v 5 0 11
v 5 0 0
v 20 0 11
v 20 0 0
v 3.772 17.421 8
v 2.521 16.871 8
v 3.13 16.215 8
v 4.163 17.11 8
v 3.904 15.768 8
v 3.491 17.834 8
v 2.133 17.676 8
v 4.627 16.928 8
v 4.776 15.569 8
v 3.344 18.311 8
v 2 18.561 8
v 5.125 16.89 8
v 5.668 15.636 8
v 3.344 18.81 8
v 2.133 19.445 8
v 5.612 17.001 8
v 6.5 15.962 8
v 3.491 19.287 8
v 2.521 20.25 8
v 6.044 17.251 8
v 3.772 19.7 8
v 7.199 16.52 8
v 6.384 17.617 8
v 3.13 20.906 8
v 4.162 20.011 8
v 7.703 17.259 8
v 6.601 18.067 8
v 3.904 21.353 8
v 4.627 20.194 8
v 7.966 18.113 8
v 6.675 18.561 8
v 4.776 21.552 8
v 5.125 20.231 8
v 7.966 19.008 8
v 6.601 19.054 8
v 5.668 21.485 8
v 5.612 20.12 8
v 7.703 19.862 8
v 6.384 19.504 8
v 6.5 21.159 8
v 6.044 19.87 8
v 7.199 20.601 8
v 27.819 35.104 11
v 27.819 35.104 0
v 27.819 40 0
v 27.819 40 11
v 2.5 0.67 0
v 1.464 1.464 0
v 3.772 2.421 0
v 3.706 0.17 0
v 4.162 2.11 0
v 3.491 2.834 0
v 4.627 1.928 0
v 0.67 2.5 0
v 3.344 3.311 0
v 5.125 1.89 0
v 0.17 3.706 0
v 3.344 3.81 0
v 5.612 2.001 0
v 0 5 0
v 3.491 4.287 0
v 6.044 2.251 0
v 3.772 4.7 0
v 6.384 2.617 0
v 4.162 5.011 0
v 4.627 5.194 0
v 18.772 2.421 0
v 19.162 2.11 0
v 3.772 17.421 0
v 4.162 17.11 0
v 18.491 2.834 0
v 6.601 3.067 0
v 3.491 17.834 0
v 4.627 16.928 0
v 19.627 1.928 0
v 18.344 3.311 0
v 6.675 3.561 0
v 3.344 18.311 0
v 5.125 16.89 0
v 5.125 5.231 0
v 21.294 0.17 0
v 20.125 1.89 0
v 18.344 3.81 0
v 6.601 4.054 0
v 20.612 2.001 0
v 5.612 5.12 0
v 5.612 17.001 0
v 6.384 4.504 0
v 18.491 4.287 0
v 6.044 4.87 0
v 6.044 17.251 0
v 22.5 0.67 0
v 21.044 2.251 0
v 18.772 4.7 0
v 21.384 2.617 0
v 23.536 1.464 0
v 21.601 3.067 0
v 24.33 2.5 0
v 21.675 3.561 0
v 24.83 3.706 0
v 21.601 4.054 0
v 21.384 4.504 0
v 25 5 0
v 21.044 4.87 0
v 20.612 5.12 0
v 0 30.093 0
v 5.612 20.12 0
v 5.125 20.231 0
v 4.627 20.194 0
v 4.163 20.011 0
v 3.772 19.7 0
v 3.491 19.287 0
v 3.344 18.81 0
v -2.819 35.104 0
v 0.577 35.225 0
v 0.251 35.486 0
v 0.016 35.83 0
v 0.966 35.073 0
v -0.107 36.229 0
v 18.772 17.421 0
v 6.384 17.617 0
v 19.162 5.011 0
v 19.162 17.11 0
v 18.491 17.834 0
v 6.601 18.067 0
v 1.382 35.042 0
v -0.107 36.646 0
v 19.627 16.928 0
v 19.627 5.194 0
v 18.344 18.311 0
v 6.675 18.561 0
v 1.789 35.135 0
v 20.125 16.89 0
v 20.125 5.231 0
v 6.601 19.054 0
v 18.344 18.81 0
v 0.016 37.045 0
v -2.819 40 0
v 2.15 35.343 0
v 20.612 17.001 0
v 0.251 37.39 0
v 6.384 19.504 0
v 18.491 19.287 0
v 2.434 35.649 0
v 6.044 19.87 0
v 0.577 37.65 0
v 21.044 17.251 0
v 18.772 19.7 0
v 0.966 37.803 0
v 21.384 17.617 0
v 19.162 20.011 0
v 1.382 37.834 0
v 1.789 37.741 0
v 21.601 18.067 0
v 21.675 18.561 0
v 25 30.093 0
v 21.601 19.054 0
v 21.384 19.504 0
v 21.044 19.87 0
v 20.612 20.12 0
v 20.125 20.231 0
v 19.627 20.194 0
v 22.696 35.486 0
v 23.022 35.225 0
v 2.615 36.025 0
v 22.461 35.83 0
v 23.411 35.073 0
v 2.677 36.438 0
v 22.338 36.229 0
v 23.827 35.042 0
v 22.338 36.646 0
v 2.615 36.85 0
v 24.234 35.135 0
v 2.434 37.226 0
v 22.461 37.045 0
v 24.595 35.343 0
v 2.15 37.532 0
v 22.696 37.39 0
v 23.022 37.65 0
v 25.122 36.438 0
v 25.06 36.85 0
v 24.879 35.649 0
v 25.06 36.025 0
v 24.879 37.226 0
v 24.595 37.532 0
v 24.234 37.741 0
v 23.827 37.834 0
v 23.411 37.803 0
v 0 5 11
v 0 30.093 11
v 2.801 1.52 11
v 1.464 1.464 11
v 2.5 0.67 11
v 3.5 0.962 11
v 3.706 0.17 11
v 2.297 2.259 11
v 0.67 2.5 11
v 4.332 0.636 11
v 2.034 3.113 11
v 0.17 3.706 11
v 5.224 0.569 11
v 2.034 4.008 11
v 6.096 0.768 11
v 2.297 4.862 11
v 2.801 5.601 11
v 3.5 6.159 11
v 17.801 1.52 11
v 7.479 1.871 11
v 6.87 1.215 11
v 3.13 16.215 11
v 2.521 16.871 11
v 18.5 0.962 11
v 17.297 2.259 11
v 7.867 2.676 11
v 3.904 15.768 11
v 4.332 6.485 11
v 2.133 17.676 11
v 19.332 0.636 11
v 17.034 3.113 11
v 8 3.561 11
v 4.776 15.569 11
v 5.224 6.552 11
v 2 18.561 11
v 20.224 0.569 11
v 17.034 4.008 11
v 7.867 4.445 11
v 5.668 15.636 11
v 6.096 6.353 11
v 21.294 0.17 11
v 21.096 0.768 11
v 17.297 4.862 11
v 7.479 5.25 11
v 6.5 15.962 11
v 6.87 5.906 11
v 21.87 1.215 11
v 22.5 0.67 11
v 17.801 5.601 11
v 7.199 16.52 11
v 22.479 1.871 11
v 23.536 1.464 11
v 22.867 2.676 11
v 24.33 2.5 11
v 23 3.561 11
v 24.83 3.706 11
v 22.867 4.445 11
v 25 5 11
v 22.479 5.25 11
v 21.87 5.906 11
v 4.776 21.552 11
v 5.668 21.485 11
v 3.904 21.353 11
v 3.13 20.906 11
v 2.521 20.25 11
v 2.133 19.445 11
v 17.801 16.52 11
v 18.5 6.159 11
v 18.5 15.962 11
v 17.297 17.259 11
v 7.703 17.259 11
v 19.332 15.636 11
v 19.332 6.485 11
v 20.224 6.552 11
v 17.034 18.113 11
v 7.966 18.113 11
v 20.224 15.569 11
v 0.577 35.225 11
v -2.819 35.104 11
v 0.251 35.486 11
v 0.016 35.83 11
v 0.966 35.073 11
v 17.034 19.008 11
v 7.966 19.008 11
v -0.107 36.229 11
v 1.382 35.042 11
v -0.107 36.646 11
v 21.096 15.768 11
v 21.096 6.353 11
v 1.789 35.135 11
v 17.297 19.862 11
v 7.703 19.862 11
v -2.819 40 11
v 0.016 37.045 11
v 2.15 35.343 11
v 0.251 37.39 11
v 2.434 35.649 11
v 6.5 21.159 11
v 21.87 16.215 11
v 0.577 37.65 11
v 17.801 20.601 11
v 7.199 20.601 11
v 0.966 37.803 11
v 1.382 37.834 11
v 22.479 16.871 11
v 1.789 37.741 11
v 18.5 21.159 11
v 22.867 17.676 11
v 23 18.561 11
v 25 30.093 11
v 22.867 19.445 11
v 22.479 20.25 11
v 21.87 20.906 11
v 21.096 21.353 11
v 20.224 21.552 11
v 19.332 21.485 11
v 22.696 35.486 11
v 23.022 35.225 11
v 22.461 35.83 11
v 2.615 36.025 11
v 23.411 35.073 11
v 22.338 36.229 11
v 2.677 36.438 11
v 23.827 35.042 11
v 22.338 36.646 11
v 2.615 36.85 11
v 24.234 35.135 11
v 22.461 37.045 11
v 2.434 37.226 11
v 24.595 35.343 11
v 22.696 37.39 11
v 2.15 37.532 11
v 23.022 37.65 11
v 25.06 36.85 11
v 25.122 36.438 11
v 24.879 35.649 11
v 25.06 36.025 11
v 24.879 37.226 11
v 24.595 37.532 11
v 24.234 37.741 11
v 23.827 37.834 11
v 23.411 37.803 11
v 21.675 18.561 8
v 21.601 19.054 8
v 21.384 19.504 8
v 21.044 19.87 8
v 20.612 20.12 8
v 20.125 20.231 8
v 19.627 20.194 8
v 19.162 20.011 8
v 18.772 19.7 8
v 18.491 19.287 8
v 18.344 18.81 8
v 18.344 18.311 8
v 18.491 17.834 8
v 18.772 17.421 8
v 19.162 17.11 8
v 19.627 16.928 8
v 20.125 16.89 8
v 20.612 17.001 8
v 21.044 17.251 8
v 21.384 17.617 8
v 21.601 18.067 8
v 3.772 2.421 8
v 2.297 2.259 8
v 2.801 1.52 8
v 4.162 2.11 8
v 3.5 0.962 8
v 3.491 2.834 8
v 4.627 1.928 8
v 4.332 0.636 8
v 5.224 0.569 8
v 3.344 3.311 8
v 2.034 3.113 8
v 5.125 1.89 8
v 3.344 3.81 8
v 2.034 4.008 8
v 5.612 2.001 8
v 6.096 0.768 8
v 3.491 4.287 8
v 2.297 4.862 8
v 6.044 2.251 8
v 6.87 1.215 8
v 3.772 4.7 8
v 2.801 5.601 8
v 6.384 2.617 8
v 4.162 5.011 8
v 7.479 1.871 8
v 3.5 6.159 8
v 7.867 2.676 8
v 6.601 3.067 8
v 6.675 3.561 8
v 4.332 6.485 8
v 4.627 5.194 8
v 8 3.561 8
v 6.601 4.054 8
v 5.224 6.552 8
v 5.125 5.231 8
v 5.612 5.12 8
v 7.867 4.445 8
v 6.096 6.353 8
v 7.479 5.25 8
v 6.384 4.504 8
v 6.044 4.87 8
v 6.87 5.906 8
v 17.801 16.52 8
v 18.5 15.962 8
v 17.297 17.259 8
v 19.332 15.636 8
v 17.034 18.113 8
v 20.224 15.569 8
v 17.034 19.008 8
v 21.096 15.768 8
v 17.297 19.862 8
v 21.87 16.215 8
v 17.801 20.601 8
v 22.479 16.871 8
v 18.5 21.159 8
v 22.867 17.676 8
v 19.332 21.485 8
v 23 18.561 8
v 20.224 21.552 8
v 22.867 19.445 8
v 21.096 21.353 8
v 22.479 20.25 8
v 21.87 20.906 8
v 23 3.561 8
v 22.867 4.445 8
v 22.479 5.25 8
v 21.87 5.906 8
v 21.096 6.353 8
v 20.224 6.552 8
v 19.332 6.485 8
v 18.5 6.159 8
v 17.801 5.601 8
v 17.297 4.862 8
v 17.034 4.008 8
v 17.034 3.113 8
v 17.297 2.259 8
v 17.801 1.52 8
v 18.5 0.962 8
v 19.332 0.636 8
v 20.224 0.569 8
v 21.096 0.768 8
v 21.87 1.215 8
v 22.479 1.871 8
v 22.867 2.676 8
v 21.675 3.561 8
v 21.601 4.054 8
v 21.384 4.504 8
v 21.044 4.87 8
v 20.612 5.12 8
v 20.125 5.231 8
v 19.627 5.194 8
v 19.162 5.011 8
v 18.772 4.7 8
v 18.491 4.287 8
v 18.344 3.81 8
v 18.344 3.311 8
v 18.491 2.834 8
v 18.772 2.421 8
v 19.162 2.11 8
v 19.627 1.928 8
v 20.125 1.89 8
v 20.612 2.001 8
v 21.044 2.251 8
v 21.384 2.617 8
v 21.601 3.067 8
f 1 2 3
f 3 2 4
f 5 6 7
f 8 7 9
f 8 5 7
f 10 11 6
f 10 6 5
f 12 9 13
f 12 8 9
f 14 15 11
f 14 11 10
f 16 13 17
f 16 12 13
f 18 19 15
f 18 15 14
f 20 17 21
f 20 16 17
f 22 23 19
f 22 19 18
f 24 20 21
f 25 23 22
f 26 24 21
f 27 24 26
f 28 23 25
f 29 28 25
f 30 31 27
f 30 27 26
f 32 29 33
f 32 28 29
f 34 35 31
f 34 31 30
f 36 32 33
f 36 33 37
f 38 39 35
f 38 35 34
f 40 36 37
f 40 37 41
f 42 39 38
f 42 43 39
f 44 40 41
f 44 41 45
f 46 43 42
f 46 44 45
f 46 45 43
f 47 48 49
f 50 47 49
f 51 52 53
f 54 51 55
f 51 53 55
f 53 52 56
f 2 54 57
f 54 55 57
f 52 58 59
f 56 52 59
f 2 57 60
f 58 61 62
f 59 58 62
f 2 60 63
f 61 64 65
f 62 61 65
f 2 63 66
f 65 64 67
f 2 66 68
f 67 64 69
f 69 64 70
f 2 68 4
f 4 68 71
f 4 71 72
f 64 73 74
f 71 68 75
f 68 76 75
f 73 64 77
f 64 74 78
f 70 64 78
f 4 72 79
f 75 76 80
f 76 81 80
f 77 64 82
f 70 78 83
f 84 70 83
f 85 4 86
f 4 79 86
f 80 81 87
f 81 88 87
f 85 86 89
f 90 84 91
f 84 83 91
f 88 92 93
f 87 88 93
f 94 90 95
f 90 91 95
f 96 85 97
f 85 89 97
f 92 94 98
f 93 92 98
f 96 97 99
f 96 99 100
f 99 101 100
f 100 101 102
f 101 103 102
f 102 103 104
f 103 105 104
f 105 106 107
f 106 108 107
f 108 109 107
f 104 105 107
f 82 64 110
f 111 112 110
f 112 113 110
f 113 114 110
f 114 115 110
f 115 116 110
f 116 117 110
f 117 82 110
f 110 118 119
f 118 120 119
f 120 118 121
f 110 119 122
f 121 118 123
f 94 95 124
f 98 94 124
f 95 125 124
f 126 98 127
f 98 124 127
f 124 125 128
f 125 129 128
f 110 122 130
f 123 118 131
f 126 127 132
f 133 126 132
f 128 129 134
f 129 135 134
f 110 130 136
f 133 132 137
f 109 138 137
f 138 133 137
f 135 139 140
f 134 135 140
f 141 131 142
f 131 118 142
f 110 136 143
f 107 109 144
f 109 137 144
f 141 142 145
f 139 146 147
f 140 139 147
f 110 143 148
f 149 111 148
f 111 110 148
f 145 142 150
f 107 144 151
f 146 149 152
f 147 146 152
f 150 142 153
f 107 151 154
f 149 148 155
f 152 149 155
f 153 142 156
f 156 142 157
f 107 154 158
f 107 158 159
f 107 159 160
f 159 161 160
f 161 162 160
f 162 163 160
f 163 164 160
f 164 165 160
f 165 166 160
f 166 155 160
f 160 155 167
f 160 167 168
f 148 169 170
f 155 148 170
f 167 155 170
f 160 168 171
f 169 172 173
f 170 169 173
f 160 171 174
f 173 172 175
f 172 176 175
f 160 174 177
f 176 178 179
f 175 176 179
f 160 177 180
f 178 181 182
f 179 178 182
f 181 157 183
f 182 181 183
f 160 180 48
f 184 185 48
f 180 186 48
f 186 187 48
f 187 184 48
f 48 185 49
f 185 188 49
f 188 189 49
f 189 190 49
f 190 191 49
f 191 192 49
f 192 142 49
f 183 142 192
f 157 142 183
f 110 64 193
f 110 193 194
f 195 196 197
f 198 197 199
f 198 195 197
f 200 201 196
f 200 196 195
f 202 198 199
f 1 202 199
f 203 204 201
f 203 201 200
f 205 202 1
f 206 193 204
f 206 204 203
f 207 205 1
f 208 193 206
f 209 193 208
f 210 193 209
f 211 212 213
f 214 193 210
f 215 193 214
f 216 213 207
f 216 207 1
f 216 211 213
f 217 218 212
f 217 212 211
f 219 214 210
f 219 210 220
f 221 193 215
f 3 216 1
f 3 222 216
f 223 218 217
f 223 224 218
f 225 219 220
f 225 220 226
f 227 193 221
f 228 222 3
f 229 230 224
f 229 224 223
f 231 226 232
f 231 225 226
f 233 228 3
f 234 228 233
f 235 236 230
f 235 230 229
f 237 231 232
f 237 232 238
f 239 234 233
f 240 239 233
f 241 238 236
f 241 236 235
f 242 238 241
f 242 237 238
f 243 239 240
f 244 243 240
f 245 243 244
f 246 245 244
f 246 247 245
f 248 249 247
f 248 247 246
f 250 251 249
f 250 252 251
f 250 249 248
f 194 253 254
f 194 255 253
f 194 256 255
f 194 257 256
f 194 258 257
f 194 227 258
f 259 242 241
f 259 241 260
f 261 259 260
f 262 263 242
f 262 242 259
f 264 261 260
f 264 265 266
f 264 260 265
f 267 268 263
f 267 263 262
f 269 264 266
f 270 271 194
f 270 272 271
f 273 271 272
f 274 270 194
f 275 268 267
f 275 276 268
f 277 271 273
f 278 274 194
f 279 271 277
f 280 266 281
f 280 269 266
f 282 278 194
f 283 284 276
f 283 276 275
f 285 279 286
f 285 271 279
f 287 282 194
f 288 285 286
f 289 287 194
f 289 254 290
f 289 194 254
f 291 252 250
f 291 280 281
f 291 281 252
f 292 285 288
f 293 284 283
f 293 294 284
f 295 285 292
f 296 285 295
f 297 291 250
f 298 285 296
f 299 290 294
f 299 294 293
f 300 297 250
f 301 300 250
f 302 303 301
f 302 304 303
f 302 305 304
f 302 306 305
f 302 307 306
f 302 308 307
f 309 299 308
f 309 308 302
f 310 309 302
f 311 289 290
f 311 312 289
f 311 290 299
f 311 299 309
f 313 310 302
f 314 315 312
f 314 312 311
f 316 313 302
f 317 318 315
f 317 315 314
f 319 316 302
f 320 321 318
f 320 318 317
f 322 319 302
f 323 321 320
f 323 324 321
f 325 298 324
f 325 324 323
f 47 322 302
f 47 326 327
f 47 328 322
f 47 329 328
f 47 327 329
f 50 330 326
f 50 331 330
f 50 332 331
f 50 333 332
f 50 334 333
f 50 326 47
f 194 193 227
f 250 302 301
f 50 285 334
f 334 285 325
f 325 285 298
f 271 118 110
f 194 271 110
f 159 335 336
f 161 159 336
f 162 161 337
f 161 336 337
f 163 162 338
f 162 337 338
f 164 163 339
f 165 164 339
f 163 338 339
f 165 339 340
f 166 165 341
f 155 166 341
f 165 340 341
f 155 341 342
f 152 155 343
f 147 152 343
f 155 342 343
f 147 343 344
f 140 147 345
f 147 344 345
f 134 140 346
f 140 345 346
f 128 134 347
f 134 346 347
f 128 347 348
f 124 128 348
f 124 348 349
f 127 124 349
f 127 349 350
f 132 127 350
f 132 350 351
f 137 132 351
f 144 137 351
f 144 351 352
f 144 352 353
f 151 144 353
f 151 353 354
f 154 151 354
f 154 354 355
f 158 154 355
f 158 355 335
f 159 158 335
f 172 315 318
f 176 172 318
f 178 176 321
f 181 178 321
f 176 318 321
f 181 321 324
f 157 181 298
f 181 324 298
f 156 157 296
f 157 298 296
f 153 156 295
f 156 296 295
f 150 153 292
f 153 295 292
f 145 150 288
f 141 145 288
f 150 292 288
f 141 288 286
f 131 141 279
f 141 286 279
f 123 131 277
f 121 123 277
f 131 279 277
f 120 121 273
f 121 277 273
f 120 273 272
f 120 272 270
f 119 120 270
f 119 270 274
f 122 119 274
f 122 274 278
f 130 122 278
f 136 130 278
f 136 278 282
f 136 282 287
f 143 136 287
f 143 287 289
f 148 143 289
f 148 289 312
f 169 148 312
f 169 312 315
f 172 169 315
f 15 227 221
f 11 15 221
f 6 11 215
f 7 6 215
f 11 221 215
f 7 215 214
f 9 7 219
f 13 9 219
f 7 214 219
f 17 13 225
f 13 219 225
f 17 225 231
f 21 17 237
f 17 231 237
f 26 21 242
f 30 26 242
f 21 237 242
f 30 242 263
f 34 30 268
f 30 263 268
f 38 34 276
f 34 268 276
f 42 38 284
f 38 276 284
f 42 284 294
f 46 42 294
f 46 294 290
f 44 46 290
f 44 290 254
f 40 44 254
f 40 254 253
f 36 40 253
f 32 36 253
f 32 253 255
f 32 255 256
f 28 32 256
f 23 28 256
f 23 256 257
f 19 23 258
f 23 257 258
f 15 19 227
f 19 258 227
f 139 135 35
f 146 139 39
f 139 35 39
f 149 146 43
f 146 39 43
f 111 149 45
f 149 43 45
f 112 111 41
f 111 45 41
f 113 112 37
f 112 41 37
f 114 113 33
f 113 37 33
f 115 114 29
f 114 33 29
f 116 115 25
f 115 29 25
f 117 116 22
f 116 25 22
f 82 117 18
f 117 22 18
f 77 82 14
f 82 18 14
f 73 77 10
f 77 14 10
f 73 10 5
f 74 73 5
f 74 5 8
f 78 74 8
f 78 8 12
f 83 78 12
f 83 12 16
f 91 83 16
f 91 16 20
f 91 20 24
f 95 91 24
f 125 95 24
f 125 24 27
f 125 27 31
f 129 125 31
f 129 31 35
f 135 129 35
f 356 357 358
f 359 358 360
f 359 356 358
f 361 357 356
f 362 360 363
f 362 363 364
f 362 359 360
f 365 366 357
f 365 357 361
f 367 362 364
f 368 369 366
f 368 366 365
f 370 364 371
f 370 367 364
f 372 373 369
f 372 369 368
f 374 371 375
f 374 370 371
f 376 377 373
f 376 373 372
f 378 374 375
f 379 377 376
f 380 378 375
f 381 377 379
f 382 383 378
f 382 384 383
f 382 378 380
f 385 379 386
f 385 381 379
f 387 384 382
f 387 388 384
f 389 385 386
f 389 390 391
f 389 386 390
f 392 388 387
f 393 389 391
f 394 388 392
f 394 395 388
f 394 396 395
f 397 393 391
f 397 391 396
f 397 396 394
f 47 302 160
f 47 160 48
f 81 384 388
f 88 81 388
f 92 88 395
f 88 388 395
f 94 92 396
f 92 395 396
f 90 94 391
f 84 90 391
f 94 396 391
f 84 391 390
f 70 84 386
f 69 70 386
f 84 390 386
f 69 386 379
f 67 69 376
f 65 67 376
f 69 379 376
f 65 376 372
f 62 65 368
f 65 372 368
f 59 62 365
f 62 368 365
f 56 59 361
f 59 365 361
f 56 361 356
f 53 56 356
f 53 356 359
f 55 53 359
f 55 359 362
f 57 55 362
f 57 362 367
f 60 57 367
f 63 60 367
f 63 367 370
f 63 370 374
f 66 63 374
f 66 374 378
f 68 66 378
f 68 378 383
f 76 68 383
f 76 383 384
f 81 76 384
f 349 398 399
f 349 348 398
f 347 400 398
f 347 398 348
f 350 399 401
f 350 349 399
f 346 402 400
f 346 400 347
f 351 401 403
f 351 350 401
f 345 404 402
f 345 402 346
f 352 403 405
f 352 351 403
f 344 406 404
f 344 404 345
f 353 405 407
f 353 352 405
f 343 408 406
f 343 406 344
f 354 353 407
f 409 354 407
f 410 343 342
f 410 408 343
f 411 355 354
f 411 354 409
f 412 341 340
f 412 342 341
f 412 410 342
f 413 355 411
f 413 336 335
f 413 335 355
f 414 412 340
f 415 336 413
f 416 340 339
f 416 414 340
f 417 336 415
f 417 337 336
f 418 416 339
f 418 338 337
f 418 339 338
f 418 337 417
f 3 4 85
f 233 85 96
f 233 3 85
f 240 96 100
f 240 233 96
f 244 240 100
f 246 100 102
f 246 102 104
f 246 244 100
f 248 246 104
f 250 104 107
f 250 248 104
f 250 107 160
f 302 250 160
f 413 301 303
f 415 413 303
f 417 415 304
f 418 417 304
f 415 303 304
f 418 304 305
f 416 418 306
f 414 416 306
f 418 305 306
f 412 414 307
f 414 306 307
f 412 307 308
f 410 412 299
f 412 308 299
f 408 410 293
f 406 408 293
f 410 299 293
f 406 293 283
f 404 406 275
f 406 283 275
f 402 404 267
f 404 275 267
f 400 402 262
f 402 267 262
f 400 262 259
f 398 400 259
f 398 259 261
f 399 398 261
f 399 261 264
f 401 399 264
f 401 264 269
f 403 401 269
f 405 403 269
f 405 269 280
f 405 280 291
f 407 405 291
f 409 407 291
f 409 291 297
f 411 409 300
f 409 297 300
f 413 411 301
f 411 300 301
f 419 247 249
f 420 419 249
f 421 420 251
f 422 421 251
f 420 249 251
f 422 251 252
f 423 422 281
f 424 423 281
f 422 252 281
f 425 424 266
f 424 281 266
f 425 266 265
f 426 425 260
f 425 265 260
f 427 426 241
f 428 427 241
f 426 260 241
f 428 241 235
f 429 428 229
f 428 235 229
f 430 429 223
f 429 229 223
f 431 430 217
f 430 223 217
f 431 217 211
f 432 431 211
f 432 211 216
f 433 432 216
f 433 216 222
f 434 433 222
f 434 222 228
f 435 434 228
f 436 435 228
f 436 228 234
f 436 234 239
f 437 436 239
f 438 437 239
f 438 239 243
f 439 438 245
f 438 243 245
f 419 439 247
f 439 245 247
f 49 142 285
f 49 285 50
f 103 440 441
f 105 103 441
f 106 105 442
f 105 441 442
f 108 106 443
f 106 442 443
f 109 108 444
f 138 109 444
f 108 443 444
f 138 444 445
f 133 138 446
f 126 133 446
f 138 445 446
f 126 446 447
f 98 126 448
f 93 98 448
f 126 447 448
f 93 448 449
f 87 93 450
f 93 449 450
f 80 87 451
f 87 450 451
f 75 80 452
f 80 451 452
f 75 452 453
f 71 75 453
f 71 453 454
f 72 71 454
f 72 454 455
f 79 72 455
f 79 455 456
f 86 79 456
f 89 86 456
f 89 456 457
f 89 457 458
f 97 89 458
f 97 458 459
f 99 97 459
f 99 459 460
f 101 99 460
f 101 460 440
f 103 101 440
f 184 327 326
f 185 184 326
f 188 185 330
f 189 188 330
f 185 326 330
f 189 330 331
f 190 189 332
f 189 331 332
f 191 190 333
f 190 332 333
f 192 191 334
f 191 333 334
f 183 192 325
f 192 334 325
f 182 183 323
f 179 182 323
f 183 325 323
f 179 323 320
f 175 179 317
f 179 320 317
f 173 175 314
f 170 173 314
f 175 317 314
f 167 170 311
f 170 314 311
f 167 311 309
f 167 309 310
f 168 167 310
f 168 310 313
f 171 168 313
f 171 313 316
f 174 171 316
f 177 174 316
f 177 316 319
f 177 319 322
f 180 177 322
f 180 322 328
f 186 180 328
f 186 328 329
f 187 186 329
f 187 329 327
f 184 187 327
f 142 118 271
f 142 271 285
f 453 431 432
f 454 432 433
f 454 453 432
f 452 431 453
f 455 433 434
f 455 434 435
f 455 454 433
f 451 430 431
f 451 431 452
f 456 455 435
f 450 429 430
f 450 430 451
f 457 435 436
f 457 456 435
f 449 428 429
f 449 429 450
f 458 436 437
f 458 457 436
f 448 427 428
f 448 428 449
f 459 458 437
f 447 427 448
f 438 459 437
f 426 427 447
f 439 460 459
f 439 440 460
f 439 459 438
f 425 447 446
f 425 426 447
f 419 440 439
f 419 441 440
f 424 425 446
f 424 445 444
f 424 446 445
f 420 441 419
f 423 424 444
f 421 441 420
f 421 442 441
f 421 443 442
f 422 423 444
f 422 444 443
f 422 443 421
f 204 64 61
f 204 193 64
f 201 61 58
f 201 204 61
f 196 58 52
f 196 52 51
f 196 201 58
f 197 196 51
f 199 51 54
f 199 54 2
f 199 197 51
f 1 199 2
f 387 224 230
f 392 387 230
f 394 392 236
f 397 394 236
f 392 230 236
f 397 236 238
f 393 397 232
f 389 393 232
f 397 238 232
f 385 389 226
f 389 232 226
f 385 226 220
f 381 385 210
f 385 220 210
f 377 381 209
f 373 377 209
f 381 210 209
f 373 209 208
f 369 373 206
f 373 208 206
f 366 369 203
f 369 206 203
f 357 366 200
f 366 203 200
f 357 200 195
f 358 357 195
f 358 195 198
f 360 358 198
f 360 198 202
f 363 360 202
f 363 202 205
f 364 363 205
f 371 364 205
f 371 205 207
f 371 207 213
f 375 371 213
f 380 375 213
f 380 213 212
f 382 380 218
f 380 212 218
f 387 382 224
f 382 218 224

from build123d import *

# Parameters (mm, degrees)
F0_W     = 25
F0_H     = 30.0927665085
F0_W_2   = 30.6387297809
F0_H_2   = 4.8959264159
F1_DEPTH = 11
F2_R     = 1.675
F3_DEPTH = 25
F4_R     = 5
F5_DEPTH = 11
F6_R     = 1.4
F7_DEPTH = 11.001
F2_R_2   = 3
F8_DEPTH = 3


# Not quite as in the source:
# - a feature names something its author has since deleted; it is built from what else it names


with BuildPart() as f1:
    # F0 (on Top) → F1 (new body)
    with BuildSketch(Plane.XY):
        with Locations((12.5, 15.0463832542)):
            Rectangle(F0_W, F0_H)
        Polygon((-2.8193648905, 35.1040735841), (0, 30.0927665085), (25, 30.0927665085), (27.8193648905, 35.1040735841), align=None)
        with Locations((12.5, 37.552036792)):
            Rectangle(F0_W_2, F0_H_2)
    extrude(amount=F1_DEPTH)

    # F2 (on face) → F3 (cut)
    with BuildSketch(Plane.XY.offset(11)):
        with BuildLine():
            ThreePointArc((3.325, 18.5605346784), (5, 16.8855346784), (6.675, 18.5605346784))
            ThreePointArc((6.675, 18.5605346784), (5, 20.2355346784), (3.325, 18.5605346784))
        make_face()
        with Locations((20, 18.5605346784)):
            Circle(F2_R)
        with Locations((20, 3.5605346784)):
            Circle(F2_R)
        with Locations((5, 3.5605346784)):
            Circle(F2_R)
    extrude(amount=-F3_DEPTH, mode=Mode.SUBTRACT)

    # F4
    f4_edges = [f1.edges().sort_by_distance(p)[0] for p in [
        (0, 0, 5.5),
        (25, 0, 5.5),
    ]]
    fillet(f4_edges, radius=F4_R)

    # F0 (on Top) → F5 (join)
    with BuildSketch(Plane.XY):
        with Locations((12.5, 37.552036792)):
            Rectangle(F0_W_2, F0_H_2)
        Polygon((-2.8193648905, 35.1040735841), (0, 30.0927665085), (25, 30.0927665085), (27.8193648905, 35.1040735841), align=None)
    extrude(amount=F5_DEPTH)

    # F6 (on face) → F7 (cut, through all)
    with BuildSketch(Plane.XY.offset(11)):
        with Locations((23.7225, 36.4378243685)):
            Circle(F6_R)
        with BuildLine():
            ThreePointArc((-0.1225, 36.4378243685), (1.2775, 35.0378243685), (2.6775, 36.4378243685))
            ThreePointArc((2.6775, 36.4378243685), (1.2775, 37.8378243685), (-0.1225, 36.4378243685))
        make_face()
    extrude(amount=-F7_DEPTH, mode=Mode.SUBTRACT)

    # F2 (on face) → F8 (cut)
    with BuildSketch(Plane.XY.offset(11)):
        with BuildLine():
            ThreePointArc((8, 18.5605346784), (5, 21.5605346784), (2, 18.5605346784))
            ThreePointArc((2, 18.5605346784), (5, 15.5605346784), (8, 18.5605346784))
        make_face()
        with BuildLine():
            ThreePointArc((3.325, 18.5605346784), (5, 20.2355346784), (6.675, 18.5605346784))
            ThreePointArc((6.675, 18.5605346784), (5, 16.8855346784), (3.325, 18.5605346784))
        make_face(mode=Mode.SUBTRACT)
        with Locations((5, 3.5605346784)):
            Circle(F2_R_2)
        with Locations((5, 3.5605346784)):
            Circle(F2_R, mode=Mode.SUBTRACT)
        with Locations((20, 18.5605346784)):
            Circle(F2_R_2)
        with Locations((20, 18.5605346784)):
            Circle(F2_R, mode=Mode.SUBTRACT)
        with Locations((20, 3.5605346784)):
            Circle(F2_R_2)
        with Locations((20, 3.5605346784)):
            Circle(F2_R, mode=Mode.SUBTRACT)
    extrude(amount=-F8_DEPTH, mode=Mode.SUBTRACT)


solid = f1.part
